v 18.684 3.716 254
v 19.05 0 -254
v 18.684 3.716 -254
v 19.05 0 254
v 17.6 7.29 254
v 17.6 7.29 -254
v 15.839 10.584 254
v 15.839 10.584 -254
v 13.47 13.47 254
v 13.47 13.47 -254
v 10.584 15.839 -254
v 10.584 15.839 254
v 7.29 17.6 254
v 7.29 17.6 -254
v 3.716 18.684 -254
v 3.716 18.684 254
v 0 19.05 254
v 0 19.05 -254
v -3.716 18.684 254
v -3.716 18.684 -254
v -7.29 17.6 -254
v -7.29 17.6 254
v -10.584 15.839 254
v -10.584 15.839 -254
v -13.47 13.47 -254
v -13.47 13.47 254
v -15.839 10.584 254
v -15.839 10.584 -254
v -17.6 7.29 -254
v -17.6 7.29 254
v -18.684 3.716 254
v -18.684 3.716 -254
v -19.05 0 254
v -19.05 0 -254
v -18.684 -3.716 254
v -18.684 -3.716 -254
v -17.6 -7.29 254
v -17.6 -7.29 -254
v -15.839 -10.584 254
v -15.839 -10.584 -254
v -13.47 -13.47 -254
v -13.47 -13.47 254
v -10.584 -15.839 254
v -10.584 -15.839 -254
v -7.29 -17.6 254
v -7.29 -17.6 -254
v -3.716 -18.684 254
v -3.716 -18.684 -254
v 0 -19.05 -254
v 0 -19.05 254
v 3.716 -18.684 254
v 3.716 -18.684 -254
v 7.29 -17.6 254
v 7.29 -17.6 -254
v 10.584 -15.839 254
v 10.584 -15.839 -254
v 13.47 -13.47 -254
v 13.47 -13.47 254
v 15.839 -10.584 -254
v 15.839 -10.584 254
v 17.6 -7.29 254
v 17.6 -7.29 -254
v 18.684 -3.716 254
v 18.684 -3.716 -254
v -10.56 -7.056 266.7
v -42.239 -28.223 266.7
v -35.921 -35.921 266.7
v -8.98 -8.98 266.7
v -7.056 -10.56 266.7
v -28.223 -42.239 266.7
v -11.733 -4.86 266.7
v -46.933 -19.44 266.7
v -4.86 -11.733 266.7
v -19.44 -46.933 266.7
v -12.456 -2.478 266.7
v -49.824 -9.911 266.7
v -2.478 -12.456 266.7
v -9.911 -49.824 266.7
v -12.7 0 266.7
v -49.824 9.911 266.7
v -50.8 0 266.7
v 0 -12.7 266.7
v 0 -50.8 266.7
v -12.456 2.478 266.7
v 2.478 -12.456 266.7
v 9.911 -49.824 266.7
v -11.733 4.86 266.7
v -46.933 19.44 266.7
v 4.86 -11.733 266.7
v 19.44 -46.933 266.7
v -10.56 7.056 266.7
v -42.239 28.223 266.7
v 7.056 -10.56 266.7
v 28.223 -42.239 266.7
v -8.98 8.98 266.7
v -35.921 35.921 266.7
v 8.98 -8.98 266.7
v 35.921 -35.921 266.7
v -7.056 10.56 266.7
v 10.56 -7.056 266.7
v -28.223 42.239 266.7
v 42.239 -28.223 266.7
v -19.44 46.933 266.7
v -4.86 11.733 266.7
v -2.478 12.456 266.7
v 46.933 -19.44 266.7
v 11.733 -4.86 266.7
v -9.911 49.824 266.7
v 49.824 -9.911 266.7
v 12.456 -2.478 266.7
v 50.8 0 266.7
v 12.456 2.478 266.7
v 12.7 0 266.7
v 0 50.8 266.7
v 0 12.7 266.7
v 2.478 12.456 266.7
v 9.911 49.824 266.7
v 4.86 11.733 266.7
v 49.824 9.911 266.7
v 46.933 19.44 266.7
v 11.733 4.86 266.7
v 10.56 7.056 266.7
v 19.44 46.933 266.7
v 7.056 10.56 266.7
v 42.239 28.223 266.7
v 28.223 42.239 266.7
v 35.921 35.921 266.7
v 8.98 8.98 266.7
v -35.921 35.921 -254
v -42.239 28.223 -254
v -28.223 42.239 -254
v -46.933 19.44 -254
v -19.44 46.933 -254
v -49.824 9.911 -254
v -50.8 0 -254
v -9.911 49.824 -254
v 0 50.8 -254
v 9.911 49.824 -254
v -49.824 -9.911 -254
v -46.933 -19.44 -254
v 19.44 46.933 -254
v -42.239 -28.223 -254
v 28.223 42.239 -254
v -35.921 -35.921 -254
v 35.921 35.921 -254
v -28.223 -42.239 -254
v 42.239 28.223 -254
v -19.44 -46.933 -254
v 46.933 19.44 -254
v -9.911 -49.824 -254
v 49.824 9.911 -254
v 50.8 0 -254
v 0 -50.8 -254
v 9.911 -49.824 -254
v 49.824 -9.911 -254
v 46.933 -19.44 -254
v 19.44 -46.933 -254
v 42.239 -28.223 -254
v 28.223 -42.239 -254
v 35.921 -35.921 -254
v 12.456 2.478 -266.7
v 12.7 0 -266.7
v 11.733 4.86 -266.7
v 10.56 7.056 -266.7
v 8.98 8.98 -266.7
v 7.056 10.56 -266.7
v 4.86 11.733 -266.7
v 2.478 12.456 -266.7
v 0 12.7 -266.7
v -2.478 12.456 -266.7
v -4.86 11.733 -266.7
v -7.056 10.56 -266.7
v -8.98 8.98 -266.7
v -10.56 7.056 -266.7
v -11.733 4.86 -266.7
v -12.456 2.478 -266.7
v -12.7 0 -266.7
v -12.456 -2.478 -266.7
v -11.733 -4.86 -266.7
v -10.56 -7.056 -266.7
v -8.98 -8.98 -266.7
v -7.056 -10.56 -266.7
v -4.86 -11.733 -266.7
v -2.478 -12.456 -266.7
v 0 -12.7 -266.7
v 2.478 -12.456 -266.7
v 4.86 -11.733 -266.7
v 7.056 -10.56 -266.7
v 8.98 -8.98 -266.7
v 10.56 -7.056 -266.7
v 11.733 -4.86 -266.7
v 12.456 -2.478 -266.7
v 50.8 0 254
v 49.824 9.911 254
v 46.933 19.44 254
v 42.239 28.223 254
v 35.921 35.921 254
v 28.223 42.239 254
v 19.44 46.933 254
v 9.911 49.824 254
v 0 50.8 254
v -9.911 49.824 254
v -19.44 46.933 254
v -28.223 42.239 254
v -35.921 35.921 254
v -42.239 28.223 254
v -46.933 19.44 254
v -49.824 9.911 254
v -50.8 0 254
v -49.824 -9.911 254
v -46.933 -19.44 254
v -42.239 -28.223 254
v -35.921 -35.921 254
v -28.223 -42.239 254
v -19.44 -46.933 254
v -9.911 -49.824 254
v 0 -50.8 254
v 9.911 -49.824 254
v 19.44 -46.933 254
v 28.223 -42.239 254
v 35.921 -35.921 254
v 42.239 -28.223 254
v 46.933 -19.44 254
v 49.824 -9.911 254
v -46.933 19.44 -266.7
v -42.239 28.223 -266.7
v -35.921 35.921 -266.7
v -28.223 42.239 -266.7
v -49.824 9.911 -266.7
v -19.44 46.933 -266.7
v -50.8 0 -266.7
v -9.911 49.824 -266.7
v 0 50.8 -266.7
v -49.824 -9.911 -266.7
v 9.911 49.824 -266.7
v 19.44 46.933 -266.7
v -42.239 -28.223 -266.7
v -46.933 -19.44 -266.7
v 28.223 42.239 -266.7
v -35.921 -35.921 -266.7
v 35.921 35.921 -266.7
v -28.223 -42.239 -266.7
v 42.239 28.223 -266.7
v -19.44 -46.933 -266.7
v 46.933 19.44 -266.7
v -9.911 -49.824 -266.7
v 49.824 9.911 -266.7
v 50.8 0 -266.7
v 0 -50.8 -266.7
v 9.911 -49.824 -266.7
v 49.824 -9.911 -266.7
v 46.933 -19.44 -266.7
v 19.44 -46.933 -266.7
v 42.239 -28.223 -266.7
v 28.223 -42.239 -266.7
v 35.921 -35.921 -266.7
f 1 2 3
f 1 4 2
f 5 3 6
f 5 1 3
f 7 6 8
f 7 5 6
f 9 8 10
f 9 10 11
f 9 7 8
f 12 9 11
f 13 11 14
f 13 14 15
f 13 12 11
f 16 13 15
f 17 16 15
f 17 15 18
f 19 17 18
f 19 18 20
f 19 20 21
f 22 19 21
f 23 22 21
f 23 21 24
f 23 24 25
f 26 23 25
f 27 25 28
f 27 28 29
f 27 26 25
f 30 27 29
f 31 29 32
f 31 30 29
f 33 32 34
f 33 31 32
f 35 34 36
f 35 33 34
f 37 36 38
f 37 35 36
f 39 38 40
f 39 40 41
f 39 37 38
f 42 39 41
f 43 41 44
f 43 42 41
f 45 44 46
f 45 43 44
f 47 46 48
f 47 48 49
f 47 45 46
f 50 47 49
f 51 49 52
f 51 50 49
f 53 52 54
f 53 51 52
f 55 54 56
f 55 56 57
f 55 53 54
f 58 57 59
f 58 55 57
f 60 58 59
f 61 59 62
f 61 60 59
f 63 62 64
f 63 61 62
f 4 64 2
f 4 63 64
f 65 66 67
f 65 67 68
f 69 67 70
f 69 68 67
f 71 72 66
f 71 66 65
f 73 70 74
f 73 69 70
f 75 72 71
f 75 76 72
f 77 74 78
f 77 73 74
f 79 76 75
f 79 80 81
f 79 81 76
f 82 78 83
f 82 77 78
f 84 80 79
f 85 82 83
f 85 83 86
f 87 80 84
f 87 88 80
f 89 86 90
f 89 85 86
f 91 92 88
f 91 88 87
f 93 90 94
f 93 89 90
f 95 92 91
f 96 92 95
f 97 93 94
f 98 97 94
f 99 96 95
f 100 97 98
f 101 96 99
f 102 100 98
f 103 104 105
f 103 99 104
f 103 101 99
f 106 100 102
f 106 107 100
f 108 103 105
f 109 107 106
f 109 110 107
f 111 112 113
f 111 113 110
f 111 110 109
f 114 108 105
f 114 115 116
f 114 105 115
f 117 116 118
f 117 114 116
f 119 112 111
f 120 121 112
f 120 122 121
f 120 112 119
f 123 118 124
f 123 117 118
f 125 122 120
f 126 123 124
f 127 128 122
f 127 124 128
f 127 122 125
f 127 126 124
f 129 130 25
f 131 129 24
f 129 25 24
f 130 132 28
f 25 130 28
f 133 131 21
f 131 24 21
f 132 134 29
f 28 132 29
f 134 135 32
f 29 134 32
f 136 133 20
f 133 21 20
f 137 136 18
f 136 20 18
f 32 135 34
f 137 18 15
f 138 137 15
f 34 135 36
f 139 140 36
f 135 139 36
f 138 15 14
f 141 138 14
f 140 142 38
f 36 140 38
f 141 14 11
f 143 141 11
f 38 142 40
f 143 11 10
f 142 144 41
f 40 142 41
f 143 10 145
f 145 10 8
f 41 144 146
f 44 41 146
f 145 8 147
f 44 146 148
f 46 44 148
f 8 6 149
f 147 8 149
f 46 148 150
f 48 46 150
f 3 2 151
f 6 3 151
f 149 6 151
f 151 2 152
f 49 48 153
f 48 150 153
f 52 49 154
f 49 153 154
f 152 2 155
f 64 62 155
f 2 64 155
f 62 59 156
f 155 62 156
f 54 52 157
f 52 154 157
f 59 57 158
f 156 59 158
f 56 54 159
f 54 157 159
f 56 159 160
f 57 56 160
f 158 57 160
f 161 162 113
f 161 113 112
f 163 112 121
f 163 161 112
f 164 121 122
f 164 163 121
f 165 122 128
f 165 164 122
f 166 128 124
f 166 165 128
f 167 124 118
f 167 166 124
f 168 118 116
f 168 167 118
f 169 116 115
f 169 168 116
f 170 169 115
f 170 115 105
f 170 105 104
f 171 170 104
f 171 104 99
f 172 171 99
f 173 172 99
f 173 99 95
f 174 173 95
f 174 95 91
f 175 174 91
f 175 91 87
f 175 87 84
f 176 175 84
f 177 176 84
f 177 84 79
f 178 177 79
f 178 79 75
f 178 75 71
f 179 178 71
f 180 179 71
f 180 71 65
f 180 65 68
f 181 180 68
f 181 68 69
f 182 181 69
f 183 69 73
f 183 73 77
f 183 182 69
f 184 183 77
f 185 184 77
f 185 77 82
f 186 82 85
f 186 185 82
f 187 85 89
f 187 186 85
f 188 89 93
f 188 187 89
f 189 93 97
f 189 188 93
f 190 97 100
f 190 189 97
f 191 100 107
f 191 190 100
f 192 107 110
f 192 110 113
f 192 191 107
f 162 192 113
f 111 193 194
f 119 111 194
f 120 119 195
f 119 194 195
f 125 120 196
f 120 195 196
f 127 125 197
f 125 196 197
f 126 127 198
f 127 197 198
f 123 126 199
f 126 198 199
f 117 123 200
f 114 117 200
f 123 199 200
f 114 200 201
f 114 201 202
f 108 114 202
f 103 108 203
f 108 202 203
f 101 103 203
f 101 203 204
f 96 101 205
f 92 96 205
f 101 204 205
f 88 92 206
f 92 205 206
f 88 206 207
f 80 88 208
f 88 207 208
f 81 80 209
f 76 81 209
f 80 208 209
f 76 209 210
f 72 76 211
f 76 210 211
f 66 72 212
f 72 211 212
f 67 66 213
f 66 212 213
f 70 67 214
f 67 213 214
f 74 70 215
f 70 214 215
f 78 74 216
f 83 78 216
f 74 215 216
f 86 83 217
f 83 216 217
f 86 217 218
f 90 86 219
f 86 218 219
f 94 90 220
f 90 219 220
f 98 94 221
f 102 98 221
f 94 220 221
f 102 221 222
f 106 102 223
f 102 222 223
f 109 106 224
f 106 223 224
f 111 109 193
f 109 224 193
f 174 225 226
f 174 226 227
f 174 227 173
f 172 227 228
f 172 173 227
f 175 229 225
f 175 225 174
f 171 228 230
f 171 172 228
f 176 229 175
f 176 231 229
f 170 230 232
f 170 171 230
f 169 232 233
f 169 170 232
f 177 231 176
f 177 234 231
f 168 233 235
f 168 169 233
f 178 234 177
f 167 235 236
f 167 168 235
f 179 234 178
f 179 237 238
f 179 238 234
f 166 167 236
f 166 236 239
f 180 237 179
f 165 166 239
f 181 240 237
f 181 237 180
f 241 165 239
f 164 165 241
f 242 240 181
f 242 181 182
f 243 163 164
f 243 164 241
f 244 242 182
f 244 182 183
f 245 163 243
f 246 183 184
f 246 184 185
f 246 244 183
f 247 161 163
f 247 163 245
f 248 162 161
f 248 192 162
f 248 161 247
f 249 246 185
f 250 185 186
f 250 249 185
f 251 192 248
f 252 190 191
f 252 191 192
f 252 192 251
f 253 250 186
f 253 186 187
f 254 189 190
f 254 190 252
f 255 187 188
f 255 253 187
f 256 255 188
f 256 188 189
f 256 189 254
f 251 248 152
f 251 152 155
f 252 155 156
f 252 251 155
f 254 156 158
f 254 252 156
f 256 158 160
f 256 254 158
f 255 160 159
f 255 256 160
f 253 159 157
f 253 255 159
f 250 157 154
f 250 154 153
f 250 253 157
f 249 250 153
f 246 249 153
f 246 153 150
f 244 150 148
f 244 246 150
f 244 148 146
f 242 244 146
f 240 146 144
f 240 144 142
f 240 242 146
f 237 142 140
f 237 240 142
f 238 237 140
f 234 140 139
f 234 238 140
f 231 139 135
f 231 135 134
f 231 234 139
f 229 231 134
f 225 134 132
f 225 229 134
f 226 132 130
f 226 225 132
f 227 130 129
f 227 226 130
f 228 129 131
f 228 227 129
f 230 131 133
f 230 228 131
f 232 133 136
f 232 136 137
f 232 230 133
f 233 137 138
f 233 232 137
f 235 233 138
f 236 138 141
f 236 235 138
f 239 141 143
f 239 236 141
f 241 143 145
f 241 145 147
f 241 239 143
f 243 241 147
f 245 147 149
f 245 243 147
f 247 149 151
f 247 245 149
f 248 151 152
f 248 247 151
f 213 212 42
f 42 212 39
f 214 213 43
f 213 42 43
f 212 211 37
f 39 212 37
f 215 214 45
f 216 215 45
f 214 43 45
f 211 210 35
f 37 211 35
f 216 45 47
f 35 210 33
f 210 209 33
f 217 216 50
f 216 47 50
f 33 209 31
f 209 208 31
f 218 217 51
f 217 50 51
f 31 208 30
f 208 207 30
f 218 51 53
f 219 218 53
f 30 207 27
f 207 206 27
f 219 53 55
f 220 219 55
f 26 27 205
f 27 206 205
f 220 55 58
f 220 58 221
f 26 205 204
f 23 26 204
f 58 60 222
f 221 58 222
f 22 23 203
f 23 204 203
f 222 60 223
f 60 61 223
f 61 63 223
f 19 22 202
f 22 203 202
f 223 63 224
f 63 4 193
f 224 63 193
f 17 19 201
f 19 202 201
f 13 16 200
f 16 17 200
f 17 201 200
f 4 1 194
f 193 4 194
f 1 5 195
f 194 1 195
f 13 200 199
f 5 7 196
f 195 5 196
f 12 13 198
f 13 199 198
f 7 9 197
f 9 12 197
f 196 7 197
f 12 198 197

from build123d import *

# Parameters (mm, degrees)
SKETCH1_R           = 19.05
SKETCH1_R_2         = 12.7
BOSS_EXTRUDE1_DEPTH = 266.7
BOSS_EXTRUDE2_START = -12.7
SKETCH2_R           = 50.8
SKETCH2_R_2         = 12.7
BOSS_EXTRUDE2_DEPTH = 12.7
SKETCH3_R           = 50.8
SKETCH3_R_2         = 12.7
BOSS_EXTRUDE3_DEPTH = 12.7


with BuildPart() as part:
    # Sketch1 → Boss-Extrude1 (new, symmetric)
    with BuildSketch(Plane.XY):
        Circle(SKETCH1_R)
        Circle(SKETCH1_R_2, mode=Mode.SUBTRACT)
    extrude(amount=BOSS_EXTRUDE1_DEPTH, both=True)

    # Sketch2 → Boss-Extrude2 (add)
    with BuildSketch(Plane.XY.offset(266.7).offset(BOSS_EXTRUDE2_START)):
        Circle(SKETCH2_R)
        Circle(SKETCH2_R_2, mode=Mode.SUBTRACT)
    extrude(amount=BOSS_EXTRUDE2_DEPTH)

    # Sketch3 → Boss-Extrude3 (add)
    with BuildSketch(Plane(origin=(0, 0, -266.7), x_dir=(-1, 0, 0), z_dir=(0, 0, -1))):
        with Locations(Location((0, 0, 0), (0, 0, 180))):
            Circle(SKETCH3_R)
        with Locations(Location((0, 0, 0), (0, 0, 180))):
            Circle(SKETCH3_R_2, mode=Mode.SUBTRACT)
    extrude(amount=-BOSS_EXTRUDE3_DEPTH)


solid = part.part
